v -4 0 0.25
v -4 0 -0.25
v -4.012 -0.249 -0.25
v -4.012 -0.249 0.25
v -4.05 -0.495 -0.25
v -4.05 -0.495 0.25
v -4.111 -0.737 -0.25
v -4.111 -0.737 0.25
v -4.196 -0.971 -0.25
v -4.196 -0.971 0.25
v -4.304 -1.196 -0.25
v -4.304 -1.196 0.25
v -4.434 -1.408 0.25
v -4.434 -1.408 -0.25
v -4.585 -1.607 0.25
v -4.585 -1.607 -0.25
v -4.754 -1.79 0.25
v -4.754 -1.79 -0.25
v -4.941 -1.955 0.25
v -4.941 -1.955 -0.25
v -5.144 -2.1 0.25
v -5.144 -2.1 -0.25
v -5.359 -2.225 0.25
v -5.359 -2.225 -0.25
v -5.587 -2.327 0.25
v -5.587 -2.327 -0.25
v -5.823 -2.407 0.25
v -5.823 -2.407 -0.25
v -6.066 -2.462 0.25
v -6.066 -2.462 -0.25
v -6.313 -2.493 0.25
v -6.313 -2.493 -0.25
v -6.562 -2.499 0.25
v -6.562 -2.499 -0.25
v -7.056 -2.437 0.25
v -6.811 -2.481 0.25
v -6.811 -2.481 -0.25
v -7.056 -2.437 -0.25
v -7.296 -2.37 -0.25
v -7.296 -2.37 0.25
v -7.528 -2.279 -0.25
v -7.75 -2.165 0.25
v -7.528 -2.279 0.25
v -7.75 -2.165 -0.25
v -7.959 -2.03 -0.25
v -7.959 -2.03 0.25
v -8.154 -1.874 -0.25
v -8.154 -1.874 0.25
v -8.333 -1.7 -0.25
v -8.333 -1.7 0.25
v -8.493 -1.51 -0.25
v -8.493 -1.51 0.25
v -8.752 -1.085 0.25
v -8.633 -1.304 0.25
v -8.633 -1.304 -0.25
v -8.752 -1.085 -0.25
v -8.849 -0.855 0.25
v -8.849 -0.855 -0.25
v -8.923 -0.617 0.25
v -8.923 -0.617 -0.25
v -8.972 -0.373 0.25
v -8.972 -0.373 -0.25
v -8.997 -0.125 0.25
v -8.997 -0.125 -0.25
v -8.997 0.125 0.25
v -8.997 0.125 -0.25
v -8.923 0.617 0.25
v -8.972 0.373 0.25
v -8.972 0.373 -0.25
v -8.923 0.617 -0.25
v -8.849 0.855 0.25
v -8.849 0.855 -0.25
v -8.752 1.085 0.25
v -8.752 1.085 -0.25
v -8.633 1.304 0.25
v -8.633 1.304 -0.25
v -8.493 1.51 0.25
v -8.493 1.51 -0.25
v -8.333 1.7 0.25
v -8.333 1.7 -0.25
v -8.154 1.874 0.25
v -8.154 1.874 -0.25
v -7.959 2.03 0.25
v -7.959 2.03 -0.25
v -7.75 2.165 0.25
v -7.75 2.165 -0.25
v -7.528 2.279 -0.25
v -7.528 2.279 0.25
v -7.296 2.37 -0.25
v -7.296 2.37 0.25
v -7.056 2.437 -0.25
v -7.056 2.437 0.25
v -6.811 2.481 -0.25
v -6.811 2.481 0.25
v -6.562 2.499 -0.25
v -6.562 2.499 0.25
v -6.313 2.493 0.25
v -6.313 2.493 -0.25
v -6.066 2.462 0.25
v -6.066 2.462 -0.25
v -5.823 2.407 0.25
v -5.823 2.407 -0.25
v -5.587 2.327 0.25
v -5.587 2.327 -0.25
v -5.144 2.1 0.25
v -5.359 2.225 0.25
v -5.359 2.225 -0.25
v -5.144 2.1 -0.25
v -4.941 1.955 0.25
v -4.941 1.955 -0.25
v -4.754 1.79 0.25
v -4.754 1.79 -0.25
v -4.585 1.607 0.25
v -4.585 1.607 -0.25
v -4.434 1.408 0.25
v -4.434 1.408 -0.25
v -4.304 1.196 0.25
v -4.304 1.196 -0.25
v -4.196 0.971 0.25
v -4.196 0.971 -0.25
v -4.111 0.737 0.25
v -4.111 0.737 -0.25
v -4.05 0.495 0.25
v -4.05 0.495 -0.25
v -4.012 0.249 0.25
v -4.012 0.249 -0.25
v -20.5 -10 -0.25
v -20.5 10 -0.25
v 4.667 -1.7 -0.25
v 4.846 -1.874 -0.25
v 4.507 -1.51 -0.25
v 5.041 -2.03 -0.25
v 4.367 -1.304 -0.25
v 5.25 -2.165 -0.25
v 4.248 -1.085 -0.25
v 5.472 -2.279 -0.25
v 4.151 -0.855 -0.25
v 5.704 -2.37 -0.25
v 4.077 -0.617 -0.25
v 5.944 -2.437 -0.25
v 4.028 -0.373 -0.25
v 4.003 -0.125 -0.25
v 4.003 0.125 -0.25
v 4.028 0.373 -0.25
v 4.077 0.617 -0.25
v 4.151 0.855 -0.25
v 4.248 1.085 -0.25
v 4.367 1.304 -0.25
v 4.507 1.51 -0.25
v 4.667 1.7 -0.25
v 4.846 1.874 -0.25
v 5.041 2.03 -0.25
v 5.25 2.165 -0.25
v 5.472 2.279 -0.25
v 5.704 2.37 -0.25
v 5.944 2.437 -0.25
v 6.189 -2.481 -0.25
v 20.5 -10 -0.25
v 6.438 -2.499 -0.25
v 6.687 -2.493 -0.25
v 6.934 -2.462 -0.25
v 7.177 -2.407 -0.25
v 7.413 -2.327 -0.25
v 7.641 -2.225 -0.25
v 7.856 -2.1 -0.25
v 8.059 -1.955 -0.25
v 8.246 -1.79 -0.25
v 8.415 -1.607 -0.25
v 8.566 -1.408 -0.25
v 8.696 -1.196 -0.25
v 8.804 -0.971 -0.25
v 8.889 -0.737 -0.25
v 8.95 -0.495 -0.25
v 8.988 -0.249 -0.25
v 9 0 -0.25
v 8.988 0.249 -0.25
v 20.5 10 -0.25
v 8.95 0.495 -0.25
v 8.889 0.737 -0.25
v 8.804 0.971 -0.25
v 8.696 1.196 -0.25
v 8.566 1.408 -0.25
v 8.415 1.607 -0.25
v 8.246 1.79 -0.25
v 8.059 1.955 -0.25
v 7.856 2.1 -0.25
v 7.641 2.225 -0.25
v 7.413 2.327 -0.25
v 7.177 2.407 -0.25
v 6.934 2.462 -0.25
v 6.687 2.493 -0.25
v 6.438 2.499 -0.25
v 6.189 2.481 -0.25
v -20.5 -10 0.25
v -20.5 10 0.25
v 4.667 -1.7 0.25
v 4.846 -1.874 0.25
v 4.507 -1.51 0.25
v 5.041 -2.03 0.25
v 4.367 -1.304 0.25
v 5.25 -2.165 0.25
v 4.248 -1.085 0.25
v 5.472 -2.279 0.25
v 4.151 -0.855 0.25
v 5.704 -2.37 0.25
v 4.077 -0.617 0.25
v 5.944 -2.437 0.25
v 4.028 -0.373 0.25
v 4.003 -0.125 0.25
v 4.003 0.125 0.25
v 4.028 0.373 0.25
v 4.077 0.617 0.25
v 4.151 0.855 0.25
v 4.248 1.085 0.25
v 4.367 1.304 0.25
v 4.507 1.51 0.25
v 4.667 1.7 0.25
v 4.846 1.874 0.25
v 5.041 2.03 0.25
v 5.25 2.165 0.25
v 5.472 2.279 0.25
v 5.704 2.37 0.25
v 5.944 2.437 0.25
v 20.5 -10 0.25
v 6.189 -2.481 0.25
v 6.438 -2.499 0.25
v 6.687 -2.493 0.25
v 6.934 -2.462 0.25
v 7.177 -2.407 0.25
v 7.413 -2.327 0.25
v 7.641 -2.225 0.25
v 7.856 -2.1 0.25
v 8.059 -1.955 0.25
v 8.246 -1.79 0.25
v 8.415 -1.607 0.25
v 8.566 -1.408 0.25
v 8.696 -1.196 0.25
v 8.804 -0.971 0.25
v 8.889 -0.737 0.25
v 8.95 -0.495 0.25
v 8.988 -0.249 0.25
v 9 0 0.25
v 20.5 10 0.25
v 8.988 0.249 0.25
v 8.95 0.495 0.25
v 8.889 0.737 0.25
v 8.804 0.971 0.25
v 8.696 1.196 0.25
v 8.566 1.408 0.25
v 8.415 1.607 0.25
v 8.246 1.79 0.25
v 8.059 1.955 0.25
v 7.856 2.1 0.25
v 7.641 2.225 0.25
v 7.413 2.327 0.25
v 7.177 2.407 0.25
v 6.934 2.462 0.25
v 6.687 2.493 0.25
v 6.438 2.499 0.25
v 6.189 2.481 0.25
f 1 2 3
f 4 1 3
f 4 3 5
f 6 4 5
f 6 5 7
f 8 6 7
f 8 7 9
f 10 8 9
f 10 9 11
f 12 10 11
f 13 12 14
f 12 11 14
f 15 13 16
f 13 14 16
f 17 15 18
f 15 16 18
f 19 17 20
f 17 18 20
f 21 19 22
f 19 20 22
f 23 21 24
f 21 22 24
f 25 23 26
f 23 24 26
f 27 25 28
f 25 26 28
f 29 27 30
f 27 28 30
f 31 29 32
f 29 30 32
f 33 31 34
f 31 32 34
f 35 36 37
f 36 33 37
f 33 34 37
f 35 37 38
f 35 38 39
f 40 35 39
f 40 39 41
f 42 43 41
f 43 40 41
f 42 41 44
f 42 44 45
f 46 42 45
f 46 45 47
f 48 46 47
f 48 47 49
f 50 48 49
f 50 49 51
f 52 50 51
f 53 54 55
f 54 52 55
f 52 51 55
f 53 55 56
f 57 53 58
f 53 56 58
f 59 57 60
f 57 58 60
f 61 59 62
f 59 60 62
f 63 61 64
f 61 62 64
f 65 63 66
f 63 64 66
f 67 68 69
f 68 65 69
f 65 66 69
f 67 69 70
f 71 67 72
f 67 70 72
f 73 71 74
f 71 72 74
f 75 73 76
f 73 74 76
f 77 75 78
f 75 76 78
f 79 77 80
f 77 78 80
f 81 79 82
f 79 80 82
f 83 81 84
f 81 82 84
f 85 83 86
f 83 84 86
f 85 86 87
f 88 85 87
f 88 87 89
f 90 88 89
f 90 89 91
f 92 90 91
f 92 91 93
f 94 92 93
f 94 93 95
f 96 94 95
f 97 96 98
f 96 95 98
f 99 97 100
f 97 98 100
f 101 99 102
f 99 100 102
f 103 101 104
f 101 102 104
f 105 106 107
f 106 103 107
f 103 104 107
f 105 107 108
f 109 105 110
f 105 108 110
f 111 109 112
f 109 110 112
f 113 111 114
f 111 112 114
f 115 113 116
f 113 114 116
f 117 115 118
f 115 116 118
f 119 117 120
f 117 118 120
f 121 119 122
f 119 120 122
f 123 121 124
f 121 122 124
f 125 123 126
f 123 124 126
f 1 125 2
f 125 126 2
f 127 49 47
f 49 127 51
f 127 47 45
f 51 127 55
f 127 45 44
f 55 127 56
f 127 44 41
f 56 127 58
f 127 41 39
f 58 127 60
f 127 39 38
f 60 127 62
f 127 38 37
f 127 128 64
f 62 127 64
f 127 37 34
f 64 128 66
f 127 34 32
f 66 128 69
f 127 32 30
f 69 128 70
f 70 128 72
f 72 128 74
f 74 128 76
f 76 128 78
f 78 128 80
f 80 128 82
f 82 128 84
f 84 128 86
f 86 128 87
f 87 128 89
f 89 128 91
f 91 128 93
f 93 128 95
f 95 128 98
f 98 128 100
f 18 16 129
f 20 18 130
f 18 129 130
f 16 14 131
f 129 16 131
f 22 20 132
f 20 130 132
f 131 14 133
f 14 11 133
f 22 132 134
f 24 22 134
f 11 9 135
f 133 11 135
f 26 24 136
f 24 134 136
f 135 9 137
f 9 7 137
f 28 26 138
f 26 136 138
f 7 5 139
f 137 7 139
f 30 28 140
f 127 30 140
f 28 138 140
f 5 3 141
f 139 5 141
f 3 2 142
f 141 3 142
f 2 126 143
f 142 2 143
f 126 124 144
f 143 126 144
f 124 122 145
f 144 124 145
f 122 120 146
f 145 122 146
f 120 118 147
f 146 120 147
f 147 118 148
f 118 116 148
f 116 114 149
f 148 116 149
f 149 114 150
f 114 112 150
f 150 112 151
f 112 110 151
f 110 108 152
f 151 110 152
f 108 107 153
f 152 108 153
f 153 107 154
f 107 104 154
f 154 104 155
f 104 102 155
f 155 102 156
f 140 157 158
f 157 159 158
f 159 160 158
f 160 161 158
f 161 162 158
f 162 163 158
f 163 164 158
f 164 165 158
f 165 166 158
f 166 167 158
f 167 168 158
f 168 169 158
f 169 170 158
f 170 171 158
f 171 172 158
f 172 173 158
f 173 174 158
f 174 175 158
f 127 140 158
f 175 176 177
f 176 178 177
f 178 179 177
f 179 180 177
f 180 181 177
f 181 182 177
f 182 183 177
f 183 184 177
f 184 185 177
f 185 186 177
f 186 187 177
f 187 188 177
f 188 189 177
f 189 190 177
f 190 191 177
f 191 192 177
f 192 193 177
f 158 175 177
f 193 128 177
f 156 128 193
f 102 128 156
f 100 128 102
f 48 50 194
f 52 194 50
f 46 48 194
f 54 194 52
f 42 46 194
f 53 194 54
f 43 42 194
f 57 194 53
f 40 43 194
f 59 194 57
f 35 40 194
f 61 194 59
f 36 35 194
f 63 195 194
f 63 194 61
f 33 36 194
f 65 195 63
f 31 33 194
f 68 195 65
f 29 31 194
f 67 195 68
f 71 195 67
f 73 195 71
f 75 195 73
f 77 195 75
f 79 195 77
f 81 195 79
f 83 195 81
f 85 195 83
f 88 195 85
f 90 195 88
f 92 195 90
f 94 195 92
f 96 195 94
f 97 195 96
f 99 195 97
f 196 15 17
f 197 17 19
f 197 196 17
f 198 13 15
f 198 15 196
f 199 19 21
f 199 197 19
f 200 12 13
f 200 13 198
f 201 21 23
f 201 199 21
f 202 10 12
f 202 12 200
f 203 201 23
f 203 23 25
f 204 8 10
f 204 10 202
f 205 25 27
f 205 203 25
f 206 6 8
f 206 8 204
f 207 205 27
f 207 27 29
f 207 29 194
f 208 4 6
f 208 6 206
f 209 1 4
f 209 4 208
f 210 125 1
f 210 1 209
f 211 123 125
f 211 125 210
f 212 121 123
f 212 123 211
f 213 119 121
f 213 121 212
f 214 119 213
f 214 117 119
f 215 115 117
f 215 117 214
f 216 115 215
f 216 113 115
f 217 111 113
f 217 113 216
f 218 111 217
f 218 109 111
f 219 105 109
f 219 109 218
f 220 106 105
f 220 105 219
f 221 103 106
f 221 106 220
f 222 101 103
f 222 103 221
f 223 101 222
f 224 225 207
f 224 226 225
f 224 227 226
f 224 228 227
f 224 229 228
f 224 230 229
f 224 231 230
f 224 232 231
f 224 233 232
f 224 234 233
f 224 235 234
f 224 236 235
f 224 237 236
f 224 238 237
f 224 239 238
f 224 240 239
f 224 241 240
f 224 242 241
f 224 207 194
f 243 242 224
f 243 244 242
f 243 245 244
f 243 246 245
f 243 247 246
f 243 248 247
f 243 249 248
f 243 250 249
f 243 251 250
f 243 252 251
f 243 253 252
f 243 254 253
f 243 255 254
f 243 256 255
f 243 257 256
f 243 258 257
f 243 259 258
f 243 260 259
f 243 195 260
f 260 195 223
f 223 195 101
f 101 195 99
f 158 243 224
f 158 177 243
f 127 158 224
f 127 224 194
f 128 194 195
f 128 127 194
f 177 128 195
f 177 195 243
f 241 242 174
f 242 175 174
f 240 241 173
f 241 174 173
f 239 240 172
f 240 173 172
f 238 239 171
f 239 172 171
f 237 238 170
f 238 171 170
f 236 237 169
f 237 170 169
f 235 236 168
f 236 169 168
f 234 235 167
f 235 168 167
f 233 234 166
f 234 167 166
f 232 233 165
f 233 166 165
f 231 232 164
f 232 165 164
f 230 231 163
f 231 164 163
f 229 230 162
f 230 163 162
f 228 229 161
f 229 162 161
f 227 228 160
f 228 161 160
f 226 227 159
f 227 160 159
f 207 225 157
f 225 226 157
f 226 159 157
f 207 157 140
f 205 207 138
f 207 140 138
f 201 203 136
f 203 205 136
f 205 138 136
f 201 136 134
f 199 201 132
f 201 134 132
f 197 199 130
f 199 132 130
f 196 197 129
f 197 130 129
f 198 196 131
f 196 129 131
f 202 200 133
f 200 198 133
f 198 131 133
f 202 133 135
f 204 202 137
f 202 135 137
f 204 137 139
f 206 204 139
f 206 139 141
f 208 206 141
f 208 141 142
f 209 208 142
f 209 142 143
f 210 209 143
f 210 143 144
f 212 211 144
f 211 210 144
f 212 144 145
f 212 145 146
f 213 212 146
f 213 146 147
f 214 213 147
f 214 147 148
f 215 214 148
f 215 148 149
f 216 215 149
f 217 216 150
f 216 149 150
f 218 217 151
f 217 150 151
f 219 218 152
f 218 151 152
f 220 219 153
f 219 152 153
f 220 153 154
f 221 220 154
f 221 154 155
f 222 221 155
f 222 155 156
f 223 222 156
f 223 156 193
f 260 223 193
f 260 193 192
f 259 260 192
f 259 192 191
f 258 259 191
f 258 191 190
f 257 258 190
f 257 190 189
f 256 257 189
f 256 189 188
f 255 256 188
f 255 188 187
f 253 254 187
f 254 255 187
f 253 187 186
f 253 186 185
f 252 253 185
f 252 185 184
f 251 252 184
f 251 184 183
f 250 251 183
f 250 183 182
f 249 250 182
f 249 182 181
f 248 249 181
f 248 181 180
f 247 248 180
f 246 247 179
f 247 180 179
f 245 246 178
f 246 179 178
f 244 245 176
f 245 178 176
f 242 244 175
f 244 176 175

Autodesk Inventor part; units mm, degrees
ref_plane "YZ Plane" through (0, 0, 0) normal (1, 0, 0) x (0, 1, 0)
ref_plane "XZ Plane" through (0, 0, 0) normal (0, 1, 0) x (-1, 0, 0)
ref_plane "XY Plane" through (0, 0, 0) normal (0, 0, 1) x (1, 0, 0)
sketch "Sketch1" plane through (0, 0, 0) normal (0, 0, 1) x (1, 0, 0)
  line L0 (-20.5, 10) -> (20.5, 10)
  line L1 (20.5, 10) -> (20.5, -10)
  line L2 (20.5, -10) -> (-20.5, -10)
  line L3 (-20.5, -10) -> (-20.5, 10)
  line L4 (-20.5, 10) -> (20.5, -10) construction
  line L5 (20.5, 10) -> (-20.5, -10) construction
  circle A0 centre (6.5, 0) radius 2.5
  circle A1 centre (-6.5, 0) radius 2.5
  point P0 (0, 0)
  dimension "d0" = 41
  dimension "d1" = 20
  dimension "d2" = 5
  dimension "d3" = 6.5
  dimension "d4" = 5
  dimension "d5" = 6.5
extrude "Extrusion1" add sketch "Sketch1" along normal mid plane 0.5
properties part number "galvo spacer"
